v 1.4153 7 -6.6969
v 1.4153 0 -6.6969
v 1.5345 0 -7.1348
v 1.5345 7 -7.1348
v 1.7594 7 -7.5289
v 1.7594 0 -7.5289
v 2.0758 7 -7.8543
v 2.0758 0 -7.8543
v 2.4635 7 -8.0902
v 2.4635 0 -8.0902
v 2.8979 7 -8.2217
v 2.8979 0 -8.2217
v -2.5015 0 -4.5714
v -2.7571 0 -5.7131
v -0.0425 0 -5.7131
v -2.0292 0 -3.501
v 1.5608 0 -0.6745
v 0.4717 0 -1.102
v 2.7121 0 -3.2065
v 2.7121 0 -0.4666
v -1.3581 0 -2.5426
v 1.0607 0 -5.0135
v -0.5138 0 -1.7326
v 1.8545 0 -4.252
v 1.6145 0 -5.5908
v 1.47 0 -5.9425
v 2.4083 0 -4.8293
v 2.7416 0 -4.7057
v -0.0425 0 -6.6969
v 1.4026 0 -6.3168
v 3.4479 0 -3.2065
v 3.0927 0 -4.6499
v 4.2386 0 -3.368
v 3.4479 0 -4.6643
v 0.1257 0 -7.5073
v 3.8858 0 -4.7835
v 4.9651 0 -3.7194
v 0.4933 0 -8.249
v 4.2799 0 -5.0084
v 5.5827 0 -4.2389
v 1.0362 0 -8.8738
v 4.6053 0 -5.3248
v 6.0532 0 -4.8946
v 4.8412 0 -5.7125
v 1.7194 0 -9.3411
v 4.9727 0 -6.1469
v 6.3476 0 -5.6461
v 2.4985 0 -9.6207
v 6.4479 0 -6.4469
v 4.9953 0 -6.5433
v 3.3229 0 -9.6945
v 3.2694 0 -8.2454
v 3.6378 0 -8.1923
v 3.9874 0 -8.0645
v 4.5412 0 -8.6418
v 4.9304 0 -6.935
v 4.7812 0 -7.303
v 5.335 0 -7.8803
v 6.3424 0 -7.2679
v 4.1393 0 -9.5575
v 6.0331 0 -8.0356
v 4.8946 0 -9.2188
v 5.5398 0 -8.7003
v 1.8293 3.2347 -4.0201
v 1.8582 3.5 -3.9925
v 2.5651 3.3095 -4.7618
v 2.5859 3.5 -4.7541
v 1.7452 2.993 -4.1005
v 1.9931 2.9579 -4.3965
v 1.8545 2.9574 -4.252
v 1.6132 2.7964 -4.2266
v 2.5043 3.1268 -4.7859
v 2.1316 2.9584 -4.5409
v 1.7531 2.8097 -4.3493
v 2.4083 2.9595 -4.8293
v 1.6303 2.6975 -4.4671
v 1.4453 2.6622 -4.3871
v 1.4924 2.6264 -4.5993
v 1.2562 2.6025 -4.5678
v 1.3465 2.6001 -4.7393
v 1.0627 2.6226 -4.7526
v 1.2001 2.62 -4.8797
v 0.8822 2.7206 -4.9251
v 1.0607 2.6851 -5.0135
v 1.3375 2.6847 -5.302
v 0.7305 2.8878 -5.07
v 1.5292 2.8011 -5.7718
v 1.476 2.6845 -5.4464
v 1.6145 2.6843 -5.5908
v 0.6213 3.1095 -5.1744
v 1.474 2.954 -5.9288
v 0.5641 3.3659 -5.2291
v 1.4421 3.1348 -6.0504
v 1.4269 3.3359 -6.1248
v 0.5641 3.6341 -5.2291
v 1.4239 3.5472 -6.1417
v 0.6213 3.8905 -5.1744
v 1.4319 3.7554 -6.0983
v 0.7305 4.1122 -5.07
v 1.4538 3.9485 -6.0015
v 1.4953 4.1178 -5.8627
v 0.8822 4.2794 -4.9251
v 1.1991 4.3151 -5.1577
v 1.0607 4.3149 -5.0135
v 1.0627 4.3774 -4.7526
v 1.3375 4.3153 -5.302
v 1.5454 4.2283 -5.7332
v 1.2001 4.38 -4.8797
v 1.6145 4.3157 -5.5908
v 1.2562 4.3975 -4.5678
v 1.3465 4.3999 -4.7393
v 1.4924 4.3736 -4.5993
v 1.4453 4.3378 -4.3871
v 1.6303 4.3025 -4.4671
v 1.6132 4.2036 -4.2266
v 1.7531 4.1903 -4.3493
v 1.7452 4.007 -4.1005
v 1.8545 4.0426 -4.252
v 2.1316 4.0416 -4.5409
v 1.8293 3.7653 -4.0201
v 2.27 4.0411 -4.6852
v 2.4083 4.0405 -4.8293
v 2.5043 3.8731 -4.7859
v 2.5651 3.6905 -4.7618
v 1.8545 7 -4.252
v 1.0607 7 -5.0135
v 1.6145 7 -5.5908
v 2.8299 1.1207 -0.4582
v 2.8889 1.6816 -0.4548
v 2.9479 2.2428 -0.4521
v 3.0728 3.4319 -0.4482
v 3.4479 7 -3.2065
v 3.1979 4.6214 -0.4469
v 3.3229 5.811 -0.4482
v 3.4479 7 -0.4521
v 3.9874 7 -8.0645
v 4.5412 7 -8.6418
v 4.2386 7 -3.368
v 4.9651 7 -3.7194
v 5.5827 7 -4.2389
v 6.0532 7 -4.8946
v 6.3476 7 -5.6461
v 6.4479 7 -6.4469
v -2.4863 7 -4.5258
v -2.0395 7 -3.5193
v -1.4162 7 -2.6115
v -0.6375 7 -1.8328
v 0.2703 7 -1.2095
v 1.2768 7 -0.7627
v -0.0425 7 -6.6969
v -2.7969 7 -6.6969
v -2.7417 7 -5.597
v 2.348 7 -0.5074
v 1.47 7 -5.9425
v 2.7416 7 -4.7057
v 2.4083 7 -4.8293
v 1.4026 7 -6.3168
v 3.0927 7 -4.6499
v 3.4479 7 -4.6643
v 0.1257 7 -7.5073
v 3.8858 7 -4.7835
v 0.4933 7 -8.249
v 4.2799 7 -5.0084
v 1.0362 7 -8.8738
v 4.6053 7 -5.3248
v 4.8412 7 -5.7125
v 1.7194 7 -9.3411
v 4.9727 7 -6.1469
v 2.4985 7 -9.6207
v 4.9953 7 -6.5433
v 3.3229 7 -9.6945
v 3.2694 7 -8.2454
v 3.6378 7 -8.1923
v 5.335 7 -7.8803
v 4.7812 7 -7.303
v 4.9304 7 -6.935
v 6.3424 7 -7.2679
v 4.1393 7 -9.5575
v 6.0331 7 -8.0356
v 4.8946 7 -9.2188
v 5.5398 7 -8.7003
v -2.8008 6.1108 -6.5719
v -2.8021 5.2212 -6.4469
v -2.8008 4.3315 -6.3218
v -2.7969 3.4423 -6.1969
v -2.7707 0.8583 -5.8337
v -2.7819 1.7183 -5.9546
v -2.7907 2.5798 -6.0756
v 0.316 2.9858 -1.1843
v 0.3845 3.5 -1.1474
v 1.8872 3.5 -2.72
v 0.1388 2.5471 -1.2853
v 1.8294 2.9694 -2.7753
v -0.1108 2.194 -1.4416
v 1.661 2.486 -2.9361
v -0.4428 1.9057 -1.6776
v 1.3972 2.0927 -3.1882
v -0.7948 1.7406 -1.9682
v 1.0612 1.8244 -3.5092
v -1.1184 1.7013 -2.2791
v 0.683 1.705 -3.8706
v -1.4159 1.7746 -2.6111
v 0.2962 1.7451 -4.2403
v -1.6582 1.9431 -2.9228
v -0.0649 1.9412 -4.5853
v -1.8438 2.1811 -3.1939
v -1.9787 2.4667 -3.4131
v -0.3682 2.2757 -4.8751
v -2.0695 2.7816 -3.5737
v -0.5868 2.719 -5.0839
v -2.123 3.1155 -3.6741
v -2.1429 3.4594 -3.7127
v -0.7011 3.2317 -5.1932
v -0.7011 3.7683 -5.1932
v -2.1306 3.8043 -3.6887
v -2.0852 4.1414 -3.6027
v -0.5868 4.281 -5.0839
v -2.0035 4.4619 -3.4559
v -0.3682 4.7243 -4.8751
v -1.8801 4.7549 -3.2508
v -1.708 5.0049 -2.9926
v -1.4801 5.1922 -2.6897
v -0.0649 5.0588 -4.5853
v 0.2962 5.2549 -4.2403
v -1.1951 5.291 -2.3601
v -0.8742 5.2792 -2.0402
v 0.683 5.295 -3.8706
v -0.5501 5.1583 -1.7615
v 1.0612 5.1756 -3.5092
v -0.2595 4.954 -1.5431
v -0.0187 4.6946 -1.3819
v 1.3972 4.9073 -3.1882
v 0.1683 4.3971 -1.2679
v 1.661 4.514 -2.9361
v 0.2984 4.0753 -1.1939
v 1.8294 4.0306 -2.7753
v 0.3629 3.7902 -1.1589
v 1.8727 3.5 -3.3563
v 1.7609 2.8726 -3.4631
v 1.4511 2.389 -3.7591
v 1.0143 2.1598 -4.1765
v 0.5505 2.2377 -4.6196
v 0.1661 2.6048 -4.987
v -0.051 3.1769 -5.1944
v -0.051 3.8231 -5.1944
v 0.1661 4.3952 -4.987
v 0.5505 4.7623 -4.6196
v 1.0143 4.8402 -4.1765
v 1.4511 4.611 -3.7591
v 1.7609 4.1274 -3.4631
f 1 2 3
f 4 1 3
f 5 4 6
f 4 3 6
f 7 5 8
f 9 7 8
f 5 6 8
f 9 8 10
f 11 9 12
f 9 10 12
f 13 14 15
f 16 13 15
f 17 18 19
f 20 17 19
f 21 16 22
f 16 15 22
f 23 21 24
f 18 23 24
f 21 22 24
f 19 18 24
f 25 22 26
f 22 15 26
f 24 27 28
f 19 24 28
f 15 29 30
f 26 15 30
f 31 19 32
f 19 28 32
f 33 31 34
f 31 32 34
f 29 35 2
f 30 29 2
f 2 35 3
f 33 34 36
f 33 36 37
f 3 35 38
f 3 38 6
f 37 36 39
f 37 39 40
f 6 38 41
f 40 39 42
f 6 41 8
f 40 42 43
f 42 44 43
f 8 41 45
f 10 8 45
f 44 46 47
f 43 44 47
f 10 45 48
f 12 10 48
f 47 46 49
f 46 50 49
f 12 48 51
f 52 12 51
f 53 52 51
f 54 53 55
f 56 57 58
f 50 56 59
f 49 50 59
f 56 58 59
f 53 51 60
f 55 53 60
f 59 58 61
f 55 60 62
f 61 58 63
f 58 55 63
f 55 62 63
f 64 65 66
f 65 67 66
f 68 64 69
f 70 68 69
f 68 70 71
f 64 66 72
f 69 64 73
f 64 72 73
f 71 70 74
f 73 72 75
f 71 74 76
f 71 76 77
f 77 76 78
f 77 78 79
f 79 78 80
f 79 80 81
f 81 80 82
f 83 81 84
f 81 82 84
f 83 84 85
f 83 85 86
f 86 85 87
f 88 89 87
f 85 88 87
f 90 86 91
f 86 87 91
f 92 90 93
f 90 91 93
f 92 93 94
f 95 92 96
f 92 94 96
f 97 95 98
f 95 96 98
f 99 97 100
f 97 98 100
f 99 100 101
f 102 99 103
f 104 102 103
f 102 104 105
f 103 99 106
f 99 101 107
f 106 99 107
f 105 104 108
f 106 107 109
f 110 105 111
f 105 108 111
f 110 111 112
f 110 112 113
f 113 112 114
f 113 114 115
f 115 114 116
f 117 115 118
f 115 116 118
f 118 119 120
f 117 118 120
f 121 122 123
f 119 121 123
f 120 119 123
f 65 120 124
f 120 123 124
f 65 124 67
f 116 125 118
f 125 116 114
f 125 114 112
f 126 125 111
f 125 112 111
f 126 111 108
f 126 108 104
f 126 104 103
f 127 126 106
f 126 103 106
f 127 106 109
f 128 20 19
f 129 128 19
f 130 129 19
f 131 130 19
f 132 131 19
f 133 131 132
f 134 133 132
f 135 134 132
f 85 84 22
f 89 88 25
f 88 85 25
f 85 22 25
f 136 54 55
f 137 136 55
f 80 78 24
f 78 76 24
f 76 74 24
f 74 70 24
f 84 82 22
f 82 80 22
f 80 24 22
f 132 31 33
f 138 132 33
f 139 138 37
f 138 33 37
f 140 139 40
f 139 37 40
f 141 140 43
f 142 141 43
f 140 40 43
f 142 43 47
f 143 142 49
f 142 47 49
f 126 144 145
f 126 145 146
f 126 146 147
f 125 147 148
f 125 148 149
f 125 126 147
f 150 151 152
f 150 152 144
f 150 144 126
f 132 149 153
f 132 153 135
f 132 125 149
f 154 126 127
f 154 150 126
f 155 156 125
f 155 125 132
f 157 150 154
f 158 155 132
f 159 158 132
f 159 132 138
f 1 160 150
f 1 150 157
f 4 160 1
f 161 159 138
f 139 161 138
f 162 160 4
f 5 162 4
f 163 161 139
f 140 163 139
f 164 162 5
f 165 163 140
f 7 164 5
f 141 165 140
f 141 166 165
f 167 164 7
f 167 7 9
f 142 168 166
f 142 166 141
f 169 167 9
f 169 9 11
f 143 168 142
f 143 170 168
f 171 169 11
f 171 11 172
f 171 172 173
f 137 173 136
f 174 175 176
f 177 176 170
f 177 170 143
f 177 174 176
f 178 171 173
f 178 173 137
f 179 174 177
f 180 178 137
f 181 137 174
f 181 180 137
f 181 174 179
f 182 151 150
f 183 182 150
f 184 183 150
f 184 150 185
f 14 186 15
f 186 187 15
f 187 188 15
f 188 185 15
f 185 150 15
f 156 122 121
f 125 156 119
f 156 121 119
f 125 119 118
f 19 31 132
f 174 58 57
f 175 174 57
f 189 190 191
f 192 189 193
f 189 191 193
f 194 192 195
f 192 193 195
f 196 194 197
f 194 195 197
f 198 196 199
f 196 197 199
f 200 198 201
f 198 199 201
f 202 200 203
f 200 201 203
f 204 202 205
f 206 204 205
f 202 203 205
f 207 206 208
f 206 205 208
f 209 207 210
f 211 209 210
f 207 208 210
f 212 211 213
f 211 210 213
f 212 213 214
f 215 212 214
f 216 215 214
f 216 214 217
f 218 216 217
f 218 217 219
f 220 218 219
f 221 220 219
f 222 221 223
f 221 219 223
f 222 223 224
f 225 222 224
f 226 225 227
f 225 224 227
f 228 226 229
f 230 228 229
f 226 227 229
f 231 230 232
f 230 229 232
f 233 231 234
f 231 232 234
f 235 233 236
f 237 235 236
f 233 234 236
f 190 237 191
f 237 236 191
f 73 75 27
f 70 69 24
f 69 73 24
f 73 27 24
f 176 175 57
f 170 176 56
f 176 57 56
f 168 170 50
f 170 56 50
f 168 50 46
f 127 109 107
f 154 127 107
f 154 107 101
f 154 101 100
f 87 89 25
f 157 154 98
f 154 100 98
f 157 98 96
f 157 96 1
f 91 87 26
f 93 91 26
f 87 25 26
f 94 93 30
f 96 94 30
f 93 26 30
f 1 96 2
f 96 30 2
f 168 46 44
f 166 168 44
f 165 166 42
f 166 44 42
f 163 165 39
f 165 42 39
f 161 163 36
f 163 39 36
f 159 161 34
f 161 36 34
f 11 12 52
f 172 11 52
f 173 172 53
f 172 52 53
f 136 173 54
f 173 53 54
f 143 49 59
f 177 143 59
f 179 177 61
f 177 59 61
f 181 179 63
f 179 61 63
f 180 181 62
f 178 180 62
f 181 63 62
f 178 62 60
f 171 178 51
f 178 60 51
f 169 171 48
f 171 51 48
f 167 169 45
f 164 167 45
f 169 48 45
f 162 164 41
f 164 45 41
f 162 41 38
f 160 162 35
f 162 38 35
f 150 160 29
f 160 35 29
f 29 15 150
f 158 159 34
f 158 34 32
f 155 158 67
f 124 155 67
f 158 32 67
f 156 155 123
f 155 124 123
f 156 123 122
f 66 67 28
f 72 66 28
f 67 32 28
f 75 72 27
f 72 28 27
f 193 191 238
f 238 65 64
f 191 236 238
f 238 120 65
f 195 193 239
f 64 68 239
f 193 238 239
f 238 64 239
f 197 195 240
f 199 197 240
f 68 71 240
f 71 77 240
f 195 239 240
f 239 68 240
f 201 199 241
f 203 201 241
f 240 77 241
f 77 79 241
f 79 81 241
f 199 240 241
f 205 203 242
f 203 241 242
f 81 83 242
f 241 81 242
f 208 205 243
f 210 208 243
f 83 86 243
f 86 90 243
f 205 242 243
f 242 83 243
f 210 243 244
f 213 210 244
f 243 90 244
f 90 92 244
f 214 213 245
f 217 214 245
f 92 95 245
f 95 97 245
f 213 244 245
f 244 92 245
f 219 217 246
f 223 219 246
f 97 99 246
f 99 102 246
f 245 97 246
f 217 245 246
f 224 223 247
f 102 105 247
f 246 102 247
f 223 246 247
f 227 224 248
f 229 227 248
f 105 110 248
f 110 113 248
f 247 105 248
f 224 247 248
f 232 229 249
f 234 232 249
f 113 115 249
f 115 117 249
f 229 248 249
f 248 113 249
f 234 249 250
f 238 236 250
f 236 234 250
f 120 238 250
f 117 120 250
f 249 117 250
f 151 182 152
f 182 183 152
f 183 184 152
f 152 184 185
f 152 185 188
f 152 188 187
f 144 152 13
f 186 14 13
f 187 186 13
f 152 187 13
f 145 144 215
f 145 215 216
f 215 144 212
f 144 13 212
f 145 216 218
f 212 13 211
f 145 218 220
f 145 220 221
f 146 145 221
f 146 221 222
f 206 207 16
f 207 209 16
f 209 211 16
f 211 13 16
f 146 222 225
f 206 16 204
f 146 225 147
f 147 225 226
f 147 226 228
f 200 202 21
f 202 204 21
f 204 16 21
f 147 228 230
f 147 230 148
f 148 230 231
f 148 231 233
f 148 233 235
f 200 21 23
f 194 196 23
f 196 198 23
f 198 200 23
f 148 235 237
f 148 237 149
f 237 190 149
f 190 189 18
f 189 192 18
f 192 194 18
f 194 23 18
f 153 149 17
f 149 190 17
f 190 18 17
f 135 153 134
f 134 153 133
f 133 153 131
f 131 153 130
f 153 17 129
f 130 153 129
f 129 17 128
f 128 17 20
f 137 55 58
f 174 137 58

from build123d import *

# Parameters (mm, degrees)
MAIN_BODY_DEPTH                        = 7
FLANG_CUT_RIGHT_DEPTH                  = 2.754419
FLANG_CUT_RIGHT_DIRECTION_2_REACH      = 15.268
FLANG_CUT_RIGHT_DIRECTION_2_END_RADIUS = 6
FLANG_CUT_LEFT_DEPTH                   = 2.754419
FLANG_CUT_LEFT_DIRECTION_2_REACH       = 17.116
FLANG_CUT_LEFT_DIRECTION_2_END_RADIUS  = 6
GUIDE_CUTS_DEPTH                       = 14.586908947


# Read off the part's stored shape, not the designer's step: CSK SLOT for M1.6 Countersunk Flat Head Screw9
with BuildPart() as part:
    # Sketch1 → main body (new body)
    with BuildSketch(Plane(origin=(0, 0, 0), x_dir=(1, 0, 0), z_dir=(0, 1, 0))):
        with BuildLine():
            Line((-0.042515674, 6.696868743), (-2.796934729, 6.696868743))
            ThreePointArc((-2.796934729, 6.696868743), (-1.044786012, 2.204228056), (3.447854676, 0.452079339))
            Line((3.447854676, 0.452079339), (3.447854676, 3.206498394))
            ThreePointArc((3.447854676, 3.206498394), (0.899757637, 4.148771704), (-0.042515674, 6.696868743))
        make_face()
        with BuildLine():
            Line((1.415300329, 6.696868743), (-0.042515674, 6.696868743))
            ThreePointArc((-0.042515674, 6.696868743), (0.899757637, 4.148771704), (3.447854676, 3.206498394))
            Line((3.447854676, 3.206498394), (3.447854676, 4.664314396))
            ThreePointArc((3.447854676, 4.664314396), (1.925062469, 5.174076537), (1.415300329, 6.696868743))
        make_face()
        with BuildLine():
            ThreePointArc((6.447854676, 6.446868743), (3.322947371, 9.694460438), (-0.042515674, 6.696868743))
            Line((-0.042515674, 6.696868743), (1.415300329, 6.696868743))
            ThreePointArc((1.415300329, 6.696868743), (1.907300469, 7.701647544), (2.897854676, 8.221692678))
            ThreePointArc((2.897854676, 8.221692678), (4.470646882, 7.719660949), (4.972678611, 6.146868743))
            ThreePointArc((4.972678611, 6.146868743), (4.452633477, 5.156314537), (3.447854676, 4.664314396))
            Line((3.447854676, 4.664314396), (3.447854676, 3.206498394))
            ThreePointArc((3.447854676, 3.206498394), (5.582702679, 4.238928527), (6.447854676, 6.446868743))
        make_face()
    extrude(amount=MAIN_BODY_DEPTH)

    # Sketch15 → flang cut right (cut)
    with BuildSketch(Plane(origin=(0, 0, -0.452079339), x_dir=(0, -1, 0), z_dir=(0, 0, 1))):
        Polygon((0, 3.447854676), (0, 2.712125029), (-7, 3.447854676), align=None)
    extrude(amount=-FLANG_CUT_RIGHT_DEPTH, mode=Mode.SUBTRACT)

    # flang cut right direction 2: up to this cylinder (the profile starts inside it)
    flang_cut_right_direction_2_end = Plane(origin=(3.197854676, 2.333333, -6.446868743), z_dir=(0, -1, 0)) * Cylinder(FLANG_CUT_RIGHT_DIRECTION_2_END_RADIUS, 43.536, mode=Mode.PRIVATE)
    # Sketch15 → flang cut right direction 2 (cut, up to the surface)
    with BuildSketch(Plane(origin=(0, 0, -0.452079339), x_dir=(0, -1, 0), z_dir=(0, 0, 1)), mode=Mode.PRIVATE) as flang_cut_right_direction_2_sk1:
        Polygon((0, 3.447854676), (0, 2.712125029), (-7, 3.447854676), align=None)
    flang_cut_right_direction_2_tool1 = extrude(flang_cut_right_direction_2_sk1.sketch, amount=FLANG_CUT_RIGHT_DIRECTION_2_REACH, mode=Mode.PRIVATE) & flang_cut_right_direction_2_end
    add(flang_cut_right_direction_2_tool1.solids().sort_by_distance((3.202611, 2.333333, -0.452079))[0], mode=Mode.SUBTRACT)

    # Sketch13 → flang cut left (cut)
    with BuildSketch(Plane(origin=(-2.796934729, 0, 0), x_dir=(0, 0, -1), z_dir=(1, 0, 0))):
        Polygon((6.696868743, 0), (6.696868743, 7), (5.7130829, 0), align=None)
    extrude(amount=FLANG_CUT_LEFT_DEPTH, mode=Mode.SUBTRACT)

    # flang cut left direction 2: up to this cylinder (the profile starts inside it)
    flang_cut_left_direction_2_end = Plane(origin=(3.197854676, 2.333333, -6.446868743), z_dir=(0, -1, 0)) * Cylinder(FLANG_CUT_LEFT_DIRECTION_2_END_RADIUS, 47.232, mode=Mode.PRIVATE)
    # Sketch13 → flang cut left direction 2 (cut, up to the surface)
    with BuildSketch(Plane(origin=(-2.796934729, 0, 0), x_dir=(0, 0, -1), z_dir=(1, 0, 0)), mode=Mode.PRIVATE) as flang_cut_left_direction_2_sk1:
        Polygon((6.696868743, 0), (6.696868743, 7), (5.7130829, 0), align=None)
    flang_cut_left_direction_2_tool1 = extrude(flang_cut_left_direction_2_sk1.sketch, amount=-FLANG_CUT_LEFT_DIRECTION_2_REACH, mode=Mode.PRIVATE) & flang_cut_left_direction_2_end
    add(flang_cut_left_direction_2_tool1.solids().sort_by_distance((-2.796935, 2.333333, -6.36894))[0], mode=Mode.SUBTRACT)

    # CSK SLOT for M1.6 Countersunk Flat H 2 → CSK SLOT for M1.6 Countersunk Flat Head Screw9 (revolve, cut)
    with BuildSketch(Plane(origin=(-1.673520994, 3.5, -1.59907768), x_dir=(0.723004631868789, 0, 0.6908431821305592), z_dir=(0, 1, 0))):
        Polygon((0.9, 4.170332063), (0.9, 5.425223714), (0, 5.425223714), (0, 0.870183673), (1.8, 0.870183673), (1.8, 3.270332063), align=None)
    revolve(axis=Axis((-1.673520994, 3.5, -1.59907768), (0.6908431821305593, 0, -0.7230046318687892)), mode=Mode.SUBTRACT)

    # Sketch11 → guide cuts (cut, through all)
    with BuildSketch(Plane.XZ):
        with BuildLine():
            Line((1.060664016, -5.013453966), (1.614472941, -5.59077162))
            ThreePointArc((1.614472941, -5.59077162), (1.951784592, -5.147904022), (2.408284716, -4.829284347))
            Line((2.408284716, -4.829284347), (1.85447579, -4.251966693))
            Line((1.85447579, -4.251966693), (1.060664016, -5.013453966))
        make_face()
        with BuildLine():
            Line((5.335045336, -7.88028352), (4.78123641, -7.302965866))
            ThreePointArc((4.78123641, -7.302965866), (4.443924759, -7.745833465), (3.987424635, -8.064453139))
            Line((3.987424635, -8.064453139), (4.541233561, -8.641770793))
            Line((4.541233561, -8.641770793), (5.335045336, -7.88028352))
        make_face()
    extrude(amount=-GUIDE_CUTS_DEPTH, mode=Mode.SUBTRACT)


solid = part.part
